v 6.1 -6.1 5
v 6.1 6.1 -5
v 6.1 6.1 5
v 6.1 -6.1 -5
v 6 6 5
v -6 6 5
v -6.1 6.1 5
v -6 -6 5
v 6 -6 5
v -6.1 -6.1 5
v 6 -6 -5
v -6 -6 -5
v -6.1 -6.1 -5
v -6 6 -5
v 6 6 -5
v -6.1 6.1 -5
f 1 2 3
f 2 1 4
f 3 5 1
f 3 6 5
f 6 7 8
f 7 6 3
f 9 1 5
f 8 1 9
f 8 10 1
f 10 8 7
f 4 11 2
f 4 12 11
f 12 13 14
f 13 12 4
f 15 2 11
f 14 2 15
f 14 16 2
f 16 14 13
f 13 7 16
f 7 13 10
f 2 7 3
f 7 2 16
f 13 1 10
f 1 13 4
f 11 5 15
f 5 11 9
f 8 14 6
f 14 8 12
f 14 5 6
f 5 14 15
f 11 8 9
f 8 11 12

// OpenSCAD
module Pipeline (length) {
    difference () {
        cube(size=[12.2, 12.2, length], center=true);
        cube(size=[12, 12, length], center=true);
    }
}

module main() {
    Pipeline (10
    )
    sphere(1,center = true);
}

main ();
